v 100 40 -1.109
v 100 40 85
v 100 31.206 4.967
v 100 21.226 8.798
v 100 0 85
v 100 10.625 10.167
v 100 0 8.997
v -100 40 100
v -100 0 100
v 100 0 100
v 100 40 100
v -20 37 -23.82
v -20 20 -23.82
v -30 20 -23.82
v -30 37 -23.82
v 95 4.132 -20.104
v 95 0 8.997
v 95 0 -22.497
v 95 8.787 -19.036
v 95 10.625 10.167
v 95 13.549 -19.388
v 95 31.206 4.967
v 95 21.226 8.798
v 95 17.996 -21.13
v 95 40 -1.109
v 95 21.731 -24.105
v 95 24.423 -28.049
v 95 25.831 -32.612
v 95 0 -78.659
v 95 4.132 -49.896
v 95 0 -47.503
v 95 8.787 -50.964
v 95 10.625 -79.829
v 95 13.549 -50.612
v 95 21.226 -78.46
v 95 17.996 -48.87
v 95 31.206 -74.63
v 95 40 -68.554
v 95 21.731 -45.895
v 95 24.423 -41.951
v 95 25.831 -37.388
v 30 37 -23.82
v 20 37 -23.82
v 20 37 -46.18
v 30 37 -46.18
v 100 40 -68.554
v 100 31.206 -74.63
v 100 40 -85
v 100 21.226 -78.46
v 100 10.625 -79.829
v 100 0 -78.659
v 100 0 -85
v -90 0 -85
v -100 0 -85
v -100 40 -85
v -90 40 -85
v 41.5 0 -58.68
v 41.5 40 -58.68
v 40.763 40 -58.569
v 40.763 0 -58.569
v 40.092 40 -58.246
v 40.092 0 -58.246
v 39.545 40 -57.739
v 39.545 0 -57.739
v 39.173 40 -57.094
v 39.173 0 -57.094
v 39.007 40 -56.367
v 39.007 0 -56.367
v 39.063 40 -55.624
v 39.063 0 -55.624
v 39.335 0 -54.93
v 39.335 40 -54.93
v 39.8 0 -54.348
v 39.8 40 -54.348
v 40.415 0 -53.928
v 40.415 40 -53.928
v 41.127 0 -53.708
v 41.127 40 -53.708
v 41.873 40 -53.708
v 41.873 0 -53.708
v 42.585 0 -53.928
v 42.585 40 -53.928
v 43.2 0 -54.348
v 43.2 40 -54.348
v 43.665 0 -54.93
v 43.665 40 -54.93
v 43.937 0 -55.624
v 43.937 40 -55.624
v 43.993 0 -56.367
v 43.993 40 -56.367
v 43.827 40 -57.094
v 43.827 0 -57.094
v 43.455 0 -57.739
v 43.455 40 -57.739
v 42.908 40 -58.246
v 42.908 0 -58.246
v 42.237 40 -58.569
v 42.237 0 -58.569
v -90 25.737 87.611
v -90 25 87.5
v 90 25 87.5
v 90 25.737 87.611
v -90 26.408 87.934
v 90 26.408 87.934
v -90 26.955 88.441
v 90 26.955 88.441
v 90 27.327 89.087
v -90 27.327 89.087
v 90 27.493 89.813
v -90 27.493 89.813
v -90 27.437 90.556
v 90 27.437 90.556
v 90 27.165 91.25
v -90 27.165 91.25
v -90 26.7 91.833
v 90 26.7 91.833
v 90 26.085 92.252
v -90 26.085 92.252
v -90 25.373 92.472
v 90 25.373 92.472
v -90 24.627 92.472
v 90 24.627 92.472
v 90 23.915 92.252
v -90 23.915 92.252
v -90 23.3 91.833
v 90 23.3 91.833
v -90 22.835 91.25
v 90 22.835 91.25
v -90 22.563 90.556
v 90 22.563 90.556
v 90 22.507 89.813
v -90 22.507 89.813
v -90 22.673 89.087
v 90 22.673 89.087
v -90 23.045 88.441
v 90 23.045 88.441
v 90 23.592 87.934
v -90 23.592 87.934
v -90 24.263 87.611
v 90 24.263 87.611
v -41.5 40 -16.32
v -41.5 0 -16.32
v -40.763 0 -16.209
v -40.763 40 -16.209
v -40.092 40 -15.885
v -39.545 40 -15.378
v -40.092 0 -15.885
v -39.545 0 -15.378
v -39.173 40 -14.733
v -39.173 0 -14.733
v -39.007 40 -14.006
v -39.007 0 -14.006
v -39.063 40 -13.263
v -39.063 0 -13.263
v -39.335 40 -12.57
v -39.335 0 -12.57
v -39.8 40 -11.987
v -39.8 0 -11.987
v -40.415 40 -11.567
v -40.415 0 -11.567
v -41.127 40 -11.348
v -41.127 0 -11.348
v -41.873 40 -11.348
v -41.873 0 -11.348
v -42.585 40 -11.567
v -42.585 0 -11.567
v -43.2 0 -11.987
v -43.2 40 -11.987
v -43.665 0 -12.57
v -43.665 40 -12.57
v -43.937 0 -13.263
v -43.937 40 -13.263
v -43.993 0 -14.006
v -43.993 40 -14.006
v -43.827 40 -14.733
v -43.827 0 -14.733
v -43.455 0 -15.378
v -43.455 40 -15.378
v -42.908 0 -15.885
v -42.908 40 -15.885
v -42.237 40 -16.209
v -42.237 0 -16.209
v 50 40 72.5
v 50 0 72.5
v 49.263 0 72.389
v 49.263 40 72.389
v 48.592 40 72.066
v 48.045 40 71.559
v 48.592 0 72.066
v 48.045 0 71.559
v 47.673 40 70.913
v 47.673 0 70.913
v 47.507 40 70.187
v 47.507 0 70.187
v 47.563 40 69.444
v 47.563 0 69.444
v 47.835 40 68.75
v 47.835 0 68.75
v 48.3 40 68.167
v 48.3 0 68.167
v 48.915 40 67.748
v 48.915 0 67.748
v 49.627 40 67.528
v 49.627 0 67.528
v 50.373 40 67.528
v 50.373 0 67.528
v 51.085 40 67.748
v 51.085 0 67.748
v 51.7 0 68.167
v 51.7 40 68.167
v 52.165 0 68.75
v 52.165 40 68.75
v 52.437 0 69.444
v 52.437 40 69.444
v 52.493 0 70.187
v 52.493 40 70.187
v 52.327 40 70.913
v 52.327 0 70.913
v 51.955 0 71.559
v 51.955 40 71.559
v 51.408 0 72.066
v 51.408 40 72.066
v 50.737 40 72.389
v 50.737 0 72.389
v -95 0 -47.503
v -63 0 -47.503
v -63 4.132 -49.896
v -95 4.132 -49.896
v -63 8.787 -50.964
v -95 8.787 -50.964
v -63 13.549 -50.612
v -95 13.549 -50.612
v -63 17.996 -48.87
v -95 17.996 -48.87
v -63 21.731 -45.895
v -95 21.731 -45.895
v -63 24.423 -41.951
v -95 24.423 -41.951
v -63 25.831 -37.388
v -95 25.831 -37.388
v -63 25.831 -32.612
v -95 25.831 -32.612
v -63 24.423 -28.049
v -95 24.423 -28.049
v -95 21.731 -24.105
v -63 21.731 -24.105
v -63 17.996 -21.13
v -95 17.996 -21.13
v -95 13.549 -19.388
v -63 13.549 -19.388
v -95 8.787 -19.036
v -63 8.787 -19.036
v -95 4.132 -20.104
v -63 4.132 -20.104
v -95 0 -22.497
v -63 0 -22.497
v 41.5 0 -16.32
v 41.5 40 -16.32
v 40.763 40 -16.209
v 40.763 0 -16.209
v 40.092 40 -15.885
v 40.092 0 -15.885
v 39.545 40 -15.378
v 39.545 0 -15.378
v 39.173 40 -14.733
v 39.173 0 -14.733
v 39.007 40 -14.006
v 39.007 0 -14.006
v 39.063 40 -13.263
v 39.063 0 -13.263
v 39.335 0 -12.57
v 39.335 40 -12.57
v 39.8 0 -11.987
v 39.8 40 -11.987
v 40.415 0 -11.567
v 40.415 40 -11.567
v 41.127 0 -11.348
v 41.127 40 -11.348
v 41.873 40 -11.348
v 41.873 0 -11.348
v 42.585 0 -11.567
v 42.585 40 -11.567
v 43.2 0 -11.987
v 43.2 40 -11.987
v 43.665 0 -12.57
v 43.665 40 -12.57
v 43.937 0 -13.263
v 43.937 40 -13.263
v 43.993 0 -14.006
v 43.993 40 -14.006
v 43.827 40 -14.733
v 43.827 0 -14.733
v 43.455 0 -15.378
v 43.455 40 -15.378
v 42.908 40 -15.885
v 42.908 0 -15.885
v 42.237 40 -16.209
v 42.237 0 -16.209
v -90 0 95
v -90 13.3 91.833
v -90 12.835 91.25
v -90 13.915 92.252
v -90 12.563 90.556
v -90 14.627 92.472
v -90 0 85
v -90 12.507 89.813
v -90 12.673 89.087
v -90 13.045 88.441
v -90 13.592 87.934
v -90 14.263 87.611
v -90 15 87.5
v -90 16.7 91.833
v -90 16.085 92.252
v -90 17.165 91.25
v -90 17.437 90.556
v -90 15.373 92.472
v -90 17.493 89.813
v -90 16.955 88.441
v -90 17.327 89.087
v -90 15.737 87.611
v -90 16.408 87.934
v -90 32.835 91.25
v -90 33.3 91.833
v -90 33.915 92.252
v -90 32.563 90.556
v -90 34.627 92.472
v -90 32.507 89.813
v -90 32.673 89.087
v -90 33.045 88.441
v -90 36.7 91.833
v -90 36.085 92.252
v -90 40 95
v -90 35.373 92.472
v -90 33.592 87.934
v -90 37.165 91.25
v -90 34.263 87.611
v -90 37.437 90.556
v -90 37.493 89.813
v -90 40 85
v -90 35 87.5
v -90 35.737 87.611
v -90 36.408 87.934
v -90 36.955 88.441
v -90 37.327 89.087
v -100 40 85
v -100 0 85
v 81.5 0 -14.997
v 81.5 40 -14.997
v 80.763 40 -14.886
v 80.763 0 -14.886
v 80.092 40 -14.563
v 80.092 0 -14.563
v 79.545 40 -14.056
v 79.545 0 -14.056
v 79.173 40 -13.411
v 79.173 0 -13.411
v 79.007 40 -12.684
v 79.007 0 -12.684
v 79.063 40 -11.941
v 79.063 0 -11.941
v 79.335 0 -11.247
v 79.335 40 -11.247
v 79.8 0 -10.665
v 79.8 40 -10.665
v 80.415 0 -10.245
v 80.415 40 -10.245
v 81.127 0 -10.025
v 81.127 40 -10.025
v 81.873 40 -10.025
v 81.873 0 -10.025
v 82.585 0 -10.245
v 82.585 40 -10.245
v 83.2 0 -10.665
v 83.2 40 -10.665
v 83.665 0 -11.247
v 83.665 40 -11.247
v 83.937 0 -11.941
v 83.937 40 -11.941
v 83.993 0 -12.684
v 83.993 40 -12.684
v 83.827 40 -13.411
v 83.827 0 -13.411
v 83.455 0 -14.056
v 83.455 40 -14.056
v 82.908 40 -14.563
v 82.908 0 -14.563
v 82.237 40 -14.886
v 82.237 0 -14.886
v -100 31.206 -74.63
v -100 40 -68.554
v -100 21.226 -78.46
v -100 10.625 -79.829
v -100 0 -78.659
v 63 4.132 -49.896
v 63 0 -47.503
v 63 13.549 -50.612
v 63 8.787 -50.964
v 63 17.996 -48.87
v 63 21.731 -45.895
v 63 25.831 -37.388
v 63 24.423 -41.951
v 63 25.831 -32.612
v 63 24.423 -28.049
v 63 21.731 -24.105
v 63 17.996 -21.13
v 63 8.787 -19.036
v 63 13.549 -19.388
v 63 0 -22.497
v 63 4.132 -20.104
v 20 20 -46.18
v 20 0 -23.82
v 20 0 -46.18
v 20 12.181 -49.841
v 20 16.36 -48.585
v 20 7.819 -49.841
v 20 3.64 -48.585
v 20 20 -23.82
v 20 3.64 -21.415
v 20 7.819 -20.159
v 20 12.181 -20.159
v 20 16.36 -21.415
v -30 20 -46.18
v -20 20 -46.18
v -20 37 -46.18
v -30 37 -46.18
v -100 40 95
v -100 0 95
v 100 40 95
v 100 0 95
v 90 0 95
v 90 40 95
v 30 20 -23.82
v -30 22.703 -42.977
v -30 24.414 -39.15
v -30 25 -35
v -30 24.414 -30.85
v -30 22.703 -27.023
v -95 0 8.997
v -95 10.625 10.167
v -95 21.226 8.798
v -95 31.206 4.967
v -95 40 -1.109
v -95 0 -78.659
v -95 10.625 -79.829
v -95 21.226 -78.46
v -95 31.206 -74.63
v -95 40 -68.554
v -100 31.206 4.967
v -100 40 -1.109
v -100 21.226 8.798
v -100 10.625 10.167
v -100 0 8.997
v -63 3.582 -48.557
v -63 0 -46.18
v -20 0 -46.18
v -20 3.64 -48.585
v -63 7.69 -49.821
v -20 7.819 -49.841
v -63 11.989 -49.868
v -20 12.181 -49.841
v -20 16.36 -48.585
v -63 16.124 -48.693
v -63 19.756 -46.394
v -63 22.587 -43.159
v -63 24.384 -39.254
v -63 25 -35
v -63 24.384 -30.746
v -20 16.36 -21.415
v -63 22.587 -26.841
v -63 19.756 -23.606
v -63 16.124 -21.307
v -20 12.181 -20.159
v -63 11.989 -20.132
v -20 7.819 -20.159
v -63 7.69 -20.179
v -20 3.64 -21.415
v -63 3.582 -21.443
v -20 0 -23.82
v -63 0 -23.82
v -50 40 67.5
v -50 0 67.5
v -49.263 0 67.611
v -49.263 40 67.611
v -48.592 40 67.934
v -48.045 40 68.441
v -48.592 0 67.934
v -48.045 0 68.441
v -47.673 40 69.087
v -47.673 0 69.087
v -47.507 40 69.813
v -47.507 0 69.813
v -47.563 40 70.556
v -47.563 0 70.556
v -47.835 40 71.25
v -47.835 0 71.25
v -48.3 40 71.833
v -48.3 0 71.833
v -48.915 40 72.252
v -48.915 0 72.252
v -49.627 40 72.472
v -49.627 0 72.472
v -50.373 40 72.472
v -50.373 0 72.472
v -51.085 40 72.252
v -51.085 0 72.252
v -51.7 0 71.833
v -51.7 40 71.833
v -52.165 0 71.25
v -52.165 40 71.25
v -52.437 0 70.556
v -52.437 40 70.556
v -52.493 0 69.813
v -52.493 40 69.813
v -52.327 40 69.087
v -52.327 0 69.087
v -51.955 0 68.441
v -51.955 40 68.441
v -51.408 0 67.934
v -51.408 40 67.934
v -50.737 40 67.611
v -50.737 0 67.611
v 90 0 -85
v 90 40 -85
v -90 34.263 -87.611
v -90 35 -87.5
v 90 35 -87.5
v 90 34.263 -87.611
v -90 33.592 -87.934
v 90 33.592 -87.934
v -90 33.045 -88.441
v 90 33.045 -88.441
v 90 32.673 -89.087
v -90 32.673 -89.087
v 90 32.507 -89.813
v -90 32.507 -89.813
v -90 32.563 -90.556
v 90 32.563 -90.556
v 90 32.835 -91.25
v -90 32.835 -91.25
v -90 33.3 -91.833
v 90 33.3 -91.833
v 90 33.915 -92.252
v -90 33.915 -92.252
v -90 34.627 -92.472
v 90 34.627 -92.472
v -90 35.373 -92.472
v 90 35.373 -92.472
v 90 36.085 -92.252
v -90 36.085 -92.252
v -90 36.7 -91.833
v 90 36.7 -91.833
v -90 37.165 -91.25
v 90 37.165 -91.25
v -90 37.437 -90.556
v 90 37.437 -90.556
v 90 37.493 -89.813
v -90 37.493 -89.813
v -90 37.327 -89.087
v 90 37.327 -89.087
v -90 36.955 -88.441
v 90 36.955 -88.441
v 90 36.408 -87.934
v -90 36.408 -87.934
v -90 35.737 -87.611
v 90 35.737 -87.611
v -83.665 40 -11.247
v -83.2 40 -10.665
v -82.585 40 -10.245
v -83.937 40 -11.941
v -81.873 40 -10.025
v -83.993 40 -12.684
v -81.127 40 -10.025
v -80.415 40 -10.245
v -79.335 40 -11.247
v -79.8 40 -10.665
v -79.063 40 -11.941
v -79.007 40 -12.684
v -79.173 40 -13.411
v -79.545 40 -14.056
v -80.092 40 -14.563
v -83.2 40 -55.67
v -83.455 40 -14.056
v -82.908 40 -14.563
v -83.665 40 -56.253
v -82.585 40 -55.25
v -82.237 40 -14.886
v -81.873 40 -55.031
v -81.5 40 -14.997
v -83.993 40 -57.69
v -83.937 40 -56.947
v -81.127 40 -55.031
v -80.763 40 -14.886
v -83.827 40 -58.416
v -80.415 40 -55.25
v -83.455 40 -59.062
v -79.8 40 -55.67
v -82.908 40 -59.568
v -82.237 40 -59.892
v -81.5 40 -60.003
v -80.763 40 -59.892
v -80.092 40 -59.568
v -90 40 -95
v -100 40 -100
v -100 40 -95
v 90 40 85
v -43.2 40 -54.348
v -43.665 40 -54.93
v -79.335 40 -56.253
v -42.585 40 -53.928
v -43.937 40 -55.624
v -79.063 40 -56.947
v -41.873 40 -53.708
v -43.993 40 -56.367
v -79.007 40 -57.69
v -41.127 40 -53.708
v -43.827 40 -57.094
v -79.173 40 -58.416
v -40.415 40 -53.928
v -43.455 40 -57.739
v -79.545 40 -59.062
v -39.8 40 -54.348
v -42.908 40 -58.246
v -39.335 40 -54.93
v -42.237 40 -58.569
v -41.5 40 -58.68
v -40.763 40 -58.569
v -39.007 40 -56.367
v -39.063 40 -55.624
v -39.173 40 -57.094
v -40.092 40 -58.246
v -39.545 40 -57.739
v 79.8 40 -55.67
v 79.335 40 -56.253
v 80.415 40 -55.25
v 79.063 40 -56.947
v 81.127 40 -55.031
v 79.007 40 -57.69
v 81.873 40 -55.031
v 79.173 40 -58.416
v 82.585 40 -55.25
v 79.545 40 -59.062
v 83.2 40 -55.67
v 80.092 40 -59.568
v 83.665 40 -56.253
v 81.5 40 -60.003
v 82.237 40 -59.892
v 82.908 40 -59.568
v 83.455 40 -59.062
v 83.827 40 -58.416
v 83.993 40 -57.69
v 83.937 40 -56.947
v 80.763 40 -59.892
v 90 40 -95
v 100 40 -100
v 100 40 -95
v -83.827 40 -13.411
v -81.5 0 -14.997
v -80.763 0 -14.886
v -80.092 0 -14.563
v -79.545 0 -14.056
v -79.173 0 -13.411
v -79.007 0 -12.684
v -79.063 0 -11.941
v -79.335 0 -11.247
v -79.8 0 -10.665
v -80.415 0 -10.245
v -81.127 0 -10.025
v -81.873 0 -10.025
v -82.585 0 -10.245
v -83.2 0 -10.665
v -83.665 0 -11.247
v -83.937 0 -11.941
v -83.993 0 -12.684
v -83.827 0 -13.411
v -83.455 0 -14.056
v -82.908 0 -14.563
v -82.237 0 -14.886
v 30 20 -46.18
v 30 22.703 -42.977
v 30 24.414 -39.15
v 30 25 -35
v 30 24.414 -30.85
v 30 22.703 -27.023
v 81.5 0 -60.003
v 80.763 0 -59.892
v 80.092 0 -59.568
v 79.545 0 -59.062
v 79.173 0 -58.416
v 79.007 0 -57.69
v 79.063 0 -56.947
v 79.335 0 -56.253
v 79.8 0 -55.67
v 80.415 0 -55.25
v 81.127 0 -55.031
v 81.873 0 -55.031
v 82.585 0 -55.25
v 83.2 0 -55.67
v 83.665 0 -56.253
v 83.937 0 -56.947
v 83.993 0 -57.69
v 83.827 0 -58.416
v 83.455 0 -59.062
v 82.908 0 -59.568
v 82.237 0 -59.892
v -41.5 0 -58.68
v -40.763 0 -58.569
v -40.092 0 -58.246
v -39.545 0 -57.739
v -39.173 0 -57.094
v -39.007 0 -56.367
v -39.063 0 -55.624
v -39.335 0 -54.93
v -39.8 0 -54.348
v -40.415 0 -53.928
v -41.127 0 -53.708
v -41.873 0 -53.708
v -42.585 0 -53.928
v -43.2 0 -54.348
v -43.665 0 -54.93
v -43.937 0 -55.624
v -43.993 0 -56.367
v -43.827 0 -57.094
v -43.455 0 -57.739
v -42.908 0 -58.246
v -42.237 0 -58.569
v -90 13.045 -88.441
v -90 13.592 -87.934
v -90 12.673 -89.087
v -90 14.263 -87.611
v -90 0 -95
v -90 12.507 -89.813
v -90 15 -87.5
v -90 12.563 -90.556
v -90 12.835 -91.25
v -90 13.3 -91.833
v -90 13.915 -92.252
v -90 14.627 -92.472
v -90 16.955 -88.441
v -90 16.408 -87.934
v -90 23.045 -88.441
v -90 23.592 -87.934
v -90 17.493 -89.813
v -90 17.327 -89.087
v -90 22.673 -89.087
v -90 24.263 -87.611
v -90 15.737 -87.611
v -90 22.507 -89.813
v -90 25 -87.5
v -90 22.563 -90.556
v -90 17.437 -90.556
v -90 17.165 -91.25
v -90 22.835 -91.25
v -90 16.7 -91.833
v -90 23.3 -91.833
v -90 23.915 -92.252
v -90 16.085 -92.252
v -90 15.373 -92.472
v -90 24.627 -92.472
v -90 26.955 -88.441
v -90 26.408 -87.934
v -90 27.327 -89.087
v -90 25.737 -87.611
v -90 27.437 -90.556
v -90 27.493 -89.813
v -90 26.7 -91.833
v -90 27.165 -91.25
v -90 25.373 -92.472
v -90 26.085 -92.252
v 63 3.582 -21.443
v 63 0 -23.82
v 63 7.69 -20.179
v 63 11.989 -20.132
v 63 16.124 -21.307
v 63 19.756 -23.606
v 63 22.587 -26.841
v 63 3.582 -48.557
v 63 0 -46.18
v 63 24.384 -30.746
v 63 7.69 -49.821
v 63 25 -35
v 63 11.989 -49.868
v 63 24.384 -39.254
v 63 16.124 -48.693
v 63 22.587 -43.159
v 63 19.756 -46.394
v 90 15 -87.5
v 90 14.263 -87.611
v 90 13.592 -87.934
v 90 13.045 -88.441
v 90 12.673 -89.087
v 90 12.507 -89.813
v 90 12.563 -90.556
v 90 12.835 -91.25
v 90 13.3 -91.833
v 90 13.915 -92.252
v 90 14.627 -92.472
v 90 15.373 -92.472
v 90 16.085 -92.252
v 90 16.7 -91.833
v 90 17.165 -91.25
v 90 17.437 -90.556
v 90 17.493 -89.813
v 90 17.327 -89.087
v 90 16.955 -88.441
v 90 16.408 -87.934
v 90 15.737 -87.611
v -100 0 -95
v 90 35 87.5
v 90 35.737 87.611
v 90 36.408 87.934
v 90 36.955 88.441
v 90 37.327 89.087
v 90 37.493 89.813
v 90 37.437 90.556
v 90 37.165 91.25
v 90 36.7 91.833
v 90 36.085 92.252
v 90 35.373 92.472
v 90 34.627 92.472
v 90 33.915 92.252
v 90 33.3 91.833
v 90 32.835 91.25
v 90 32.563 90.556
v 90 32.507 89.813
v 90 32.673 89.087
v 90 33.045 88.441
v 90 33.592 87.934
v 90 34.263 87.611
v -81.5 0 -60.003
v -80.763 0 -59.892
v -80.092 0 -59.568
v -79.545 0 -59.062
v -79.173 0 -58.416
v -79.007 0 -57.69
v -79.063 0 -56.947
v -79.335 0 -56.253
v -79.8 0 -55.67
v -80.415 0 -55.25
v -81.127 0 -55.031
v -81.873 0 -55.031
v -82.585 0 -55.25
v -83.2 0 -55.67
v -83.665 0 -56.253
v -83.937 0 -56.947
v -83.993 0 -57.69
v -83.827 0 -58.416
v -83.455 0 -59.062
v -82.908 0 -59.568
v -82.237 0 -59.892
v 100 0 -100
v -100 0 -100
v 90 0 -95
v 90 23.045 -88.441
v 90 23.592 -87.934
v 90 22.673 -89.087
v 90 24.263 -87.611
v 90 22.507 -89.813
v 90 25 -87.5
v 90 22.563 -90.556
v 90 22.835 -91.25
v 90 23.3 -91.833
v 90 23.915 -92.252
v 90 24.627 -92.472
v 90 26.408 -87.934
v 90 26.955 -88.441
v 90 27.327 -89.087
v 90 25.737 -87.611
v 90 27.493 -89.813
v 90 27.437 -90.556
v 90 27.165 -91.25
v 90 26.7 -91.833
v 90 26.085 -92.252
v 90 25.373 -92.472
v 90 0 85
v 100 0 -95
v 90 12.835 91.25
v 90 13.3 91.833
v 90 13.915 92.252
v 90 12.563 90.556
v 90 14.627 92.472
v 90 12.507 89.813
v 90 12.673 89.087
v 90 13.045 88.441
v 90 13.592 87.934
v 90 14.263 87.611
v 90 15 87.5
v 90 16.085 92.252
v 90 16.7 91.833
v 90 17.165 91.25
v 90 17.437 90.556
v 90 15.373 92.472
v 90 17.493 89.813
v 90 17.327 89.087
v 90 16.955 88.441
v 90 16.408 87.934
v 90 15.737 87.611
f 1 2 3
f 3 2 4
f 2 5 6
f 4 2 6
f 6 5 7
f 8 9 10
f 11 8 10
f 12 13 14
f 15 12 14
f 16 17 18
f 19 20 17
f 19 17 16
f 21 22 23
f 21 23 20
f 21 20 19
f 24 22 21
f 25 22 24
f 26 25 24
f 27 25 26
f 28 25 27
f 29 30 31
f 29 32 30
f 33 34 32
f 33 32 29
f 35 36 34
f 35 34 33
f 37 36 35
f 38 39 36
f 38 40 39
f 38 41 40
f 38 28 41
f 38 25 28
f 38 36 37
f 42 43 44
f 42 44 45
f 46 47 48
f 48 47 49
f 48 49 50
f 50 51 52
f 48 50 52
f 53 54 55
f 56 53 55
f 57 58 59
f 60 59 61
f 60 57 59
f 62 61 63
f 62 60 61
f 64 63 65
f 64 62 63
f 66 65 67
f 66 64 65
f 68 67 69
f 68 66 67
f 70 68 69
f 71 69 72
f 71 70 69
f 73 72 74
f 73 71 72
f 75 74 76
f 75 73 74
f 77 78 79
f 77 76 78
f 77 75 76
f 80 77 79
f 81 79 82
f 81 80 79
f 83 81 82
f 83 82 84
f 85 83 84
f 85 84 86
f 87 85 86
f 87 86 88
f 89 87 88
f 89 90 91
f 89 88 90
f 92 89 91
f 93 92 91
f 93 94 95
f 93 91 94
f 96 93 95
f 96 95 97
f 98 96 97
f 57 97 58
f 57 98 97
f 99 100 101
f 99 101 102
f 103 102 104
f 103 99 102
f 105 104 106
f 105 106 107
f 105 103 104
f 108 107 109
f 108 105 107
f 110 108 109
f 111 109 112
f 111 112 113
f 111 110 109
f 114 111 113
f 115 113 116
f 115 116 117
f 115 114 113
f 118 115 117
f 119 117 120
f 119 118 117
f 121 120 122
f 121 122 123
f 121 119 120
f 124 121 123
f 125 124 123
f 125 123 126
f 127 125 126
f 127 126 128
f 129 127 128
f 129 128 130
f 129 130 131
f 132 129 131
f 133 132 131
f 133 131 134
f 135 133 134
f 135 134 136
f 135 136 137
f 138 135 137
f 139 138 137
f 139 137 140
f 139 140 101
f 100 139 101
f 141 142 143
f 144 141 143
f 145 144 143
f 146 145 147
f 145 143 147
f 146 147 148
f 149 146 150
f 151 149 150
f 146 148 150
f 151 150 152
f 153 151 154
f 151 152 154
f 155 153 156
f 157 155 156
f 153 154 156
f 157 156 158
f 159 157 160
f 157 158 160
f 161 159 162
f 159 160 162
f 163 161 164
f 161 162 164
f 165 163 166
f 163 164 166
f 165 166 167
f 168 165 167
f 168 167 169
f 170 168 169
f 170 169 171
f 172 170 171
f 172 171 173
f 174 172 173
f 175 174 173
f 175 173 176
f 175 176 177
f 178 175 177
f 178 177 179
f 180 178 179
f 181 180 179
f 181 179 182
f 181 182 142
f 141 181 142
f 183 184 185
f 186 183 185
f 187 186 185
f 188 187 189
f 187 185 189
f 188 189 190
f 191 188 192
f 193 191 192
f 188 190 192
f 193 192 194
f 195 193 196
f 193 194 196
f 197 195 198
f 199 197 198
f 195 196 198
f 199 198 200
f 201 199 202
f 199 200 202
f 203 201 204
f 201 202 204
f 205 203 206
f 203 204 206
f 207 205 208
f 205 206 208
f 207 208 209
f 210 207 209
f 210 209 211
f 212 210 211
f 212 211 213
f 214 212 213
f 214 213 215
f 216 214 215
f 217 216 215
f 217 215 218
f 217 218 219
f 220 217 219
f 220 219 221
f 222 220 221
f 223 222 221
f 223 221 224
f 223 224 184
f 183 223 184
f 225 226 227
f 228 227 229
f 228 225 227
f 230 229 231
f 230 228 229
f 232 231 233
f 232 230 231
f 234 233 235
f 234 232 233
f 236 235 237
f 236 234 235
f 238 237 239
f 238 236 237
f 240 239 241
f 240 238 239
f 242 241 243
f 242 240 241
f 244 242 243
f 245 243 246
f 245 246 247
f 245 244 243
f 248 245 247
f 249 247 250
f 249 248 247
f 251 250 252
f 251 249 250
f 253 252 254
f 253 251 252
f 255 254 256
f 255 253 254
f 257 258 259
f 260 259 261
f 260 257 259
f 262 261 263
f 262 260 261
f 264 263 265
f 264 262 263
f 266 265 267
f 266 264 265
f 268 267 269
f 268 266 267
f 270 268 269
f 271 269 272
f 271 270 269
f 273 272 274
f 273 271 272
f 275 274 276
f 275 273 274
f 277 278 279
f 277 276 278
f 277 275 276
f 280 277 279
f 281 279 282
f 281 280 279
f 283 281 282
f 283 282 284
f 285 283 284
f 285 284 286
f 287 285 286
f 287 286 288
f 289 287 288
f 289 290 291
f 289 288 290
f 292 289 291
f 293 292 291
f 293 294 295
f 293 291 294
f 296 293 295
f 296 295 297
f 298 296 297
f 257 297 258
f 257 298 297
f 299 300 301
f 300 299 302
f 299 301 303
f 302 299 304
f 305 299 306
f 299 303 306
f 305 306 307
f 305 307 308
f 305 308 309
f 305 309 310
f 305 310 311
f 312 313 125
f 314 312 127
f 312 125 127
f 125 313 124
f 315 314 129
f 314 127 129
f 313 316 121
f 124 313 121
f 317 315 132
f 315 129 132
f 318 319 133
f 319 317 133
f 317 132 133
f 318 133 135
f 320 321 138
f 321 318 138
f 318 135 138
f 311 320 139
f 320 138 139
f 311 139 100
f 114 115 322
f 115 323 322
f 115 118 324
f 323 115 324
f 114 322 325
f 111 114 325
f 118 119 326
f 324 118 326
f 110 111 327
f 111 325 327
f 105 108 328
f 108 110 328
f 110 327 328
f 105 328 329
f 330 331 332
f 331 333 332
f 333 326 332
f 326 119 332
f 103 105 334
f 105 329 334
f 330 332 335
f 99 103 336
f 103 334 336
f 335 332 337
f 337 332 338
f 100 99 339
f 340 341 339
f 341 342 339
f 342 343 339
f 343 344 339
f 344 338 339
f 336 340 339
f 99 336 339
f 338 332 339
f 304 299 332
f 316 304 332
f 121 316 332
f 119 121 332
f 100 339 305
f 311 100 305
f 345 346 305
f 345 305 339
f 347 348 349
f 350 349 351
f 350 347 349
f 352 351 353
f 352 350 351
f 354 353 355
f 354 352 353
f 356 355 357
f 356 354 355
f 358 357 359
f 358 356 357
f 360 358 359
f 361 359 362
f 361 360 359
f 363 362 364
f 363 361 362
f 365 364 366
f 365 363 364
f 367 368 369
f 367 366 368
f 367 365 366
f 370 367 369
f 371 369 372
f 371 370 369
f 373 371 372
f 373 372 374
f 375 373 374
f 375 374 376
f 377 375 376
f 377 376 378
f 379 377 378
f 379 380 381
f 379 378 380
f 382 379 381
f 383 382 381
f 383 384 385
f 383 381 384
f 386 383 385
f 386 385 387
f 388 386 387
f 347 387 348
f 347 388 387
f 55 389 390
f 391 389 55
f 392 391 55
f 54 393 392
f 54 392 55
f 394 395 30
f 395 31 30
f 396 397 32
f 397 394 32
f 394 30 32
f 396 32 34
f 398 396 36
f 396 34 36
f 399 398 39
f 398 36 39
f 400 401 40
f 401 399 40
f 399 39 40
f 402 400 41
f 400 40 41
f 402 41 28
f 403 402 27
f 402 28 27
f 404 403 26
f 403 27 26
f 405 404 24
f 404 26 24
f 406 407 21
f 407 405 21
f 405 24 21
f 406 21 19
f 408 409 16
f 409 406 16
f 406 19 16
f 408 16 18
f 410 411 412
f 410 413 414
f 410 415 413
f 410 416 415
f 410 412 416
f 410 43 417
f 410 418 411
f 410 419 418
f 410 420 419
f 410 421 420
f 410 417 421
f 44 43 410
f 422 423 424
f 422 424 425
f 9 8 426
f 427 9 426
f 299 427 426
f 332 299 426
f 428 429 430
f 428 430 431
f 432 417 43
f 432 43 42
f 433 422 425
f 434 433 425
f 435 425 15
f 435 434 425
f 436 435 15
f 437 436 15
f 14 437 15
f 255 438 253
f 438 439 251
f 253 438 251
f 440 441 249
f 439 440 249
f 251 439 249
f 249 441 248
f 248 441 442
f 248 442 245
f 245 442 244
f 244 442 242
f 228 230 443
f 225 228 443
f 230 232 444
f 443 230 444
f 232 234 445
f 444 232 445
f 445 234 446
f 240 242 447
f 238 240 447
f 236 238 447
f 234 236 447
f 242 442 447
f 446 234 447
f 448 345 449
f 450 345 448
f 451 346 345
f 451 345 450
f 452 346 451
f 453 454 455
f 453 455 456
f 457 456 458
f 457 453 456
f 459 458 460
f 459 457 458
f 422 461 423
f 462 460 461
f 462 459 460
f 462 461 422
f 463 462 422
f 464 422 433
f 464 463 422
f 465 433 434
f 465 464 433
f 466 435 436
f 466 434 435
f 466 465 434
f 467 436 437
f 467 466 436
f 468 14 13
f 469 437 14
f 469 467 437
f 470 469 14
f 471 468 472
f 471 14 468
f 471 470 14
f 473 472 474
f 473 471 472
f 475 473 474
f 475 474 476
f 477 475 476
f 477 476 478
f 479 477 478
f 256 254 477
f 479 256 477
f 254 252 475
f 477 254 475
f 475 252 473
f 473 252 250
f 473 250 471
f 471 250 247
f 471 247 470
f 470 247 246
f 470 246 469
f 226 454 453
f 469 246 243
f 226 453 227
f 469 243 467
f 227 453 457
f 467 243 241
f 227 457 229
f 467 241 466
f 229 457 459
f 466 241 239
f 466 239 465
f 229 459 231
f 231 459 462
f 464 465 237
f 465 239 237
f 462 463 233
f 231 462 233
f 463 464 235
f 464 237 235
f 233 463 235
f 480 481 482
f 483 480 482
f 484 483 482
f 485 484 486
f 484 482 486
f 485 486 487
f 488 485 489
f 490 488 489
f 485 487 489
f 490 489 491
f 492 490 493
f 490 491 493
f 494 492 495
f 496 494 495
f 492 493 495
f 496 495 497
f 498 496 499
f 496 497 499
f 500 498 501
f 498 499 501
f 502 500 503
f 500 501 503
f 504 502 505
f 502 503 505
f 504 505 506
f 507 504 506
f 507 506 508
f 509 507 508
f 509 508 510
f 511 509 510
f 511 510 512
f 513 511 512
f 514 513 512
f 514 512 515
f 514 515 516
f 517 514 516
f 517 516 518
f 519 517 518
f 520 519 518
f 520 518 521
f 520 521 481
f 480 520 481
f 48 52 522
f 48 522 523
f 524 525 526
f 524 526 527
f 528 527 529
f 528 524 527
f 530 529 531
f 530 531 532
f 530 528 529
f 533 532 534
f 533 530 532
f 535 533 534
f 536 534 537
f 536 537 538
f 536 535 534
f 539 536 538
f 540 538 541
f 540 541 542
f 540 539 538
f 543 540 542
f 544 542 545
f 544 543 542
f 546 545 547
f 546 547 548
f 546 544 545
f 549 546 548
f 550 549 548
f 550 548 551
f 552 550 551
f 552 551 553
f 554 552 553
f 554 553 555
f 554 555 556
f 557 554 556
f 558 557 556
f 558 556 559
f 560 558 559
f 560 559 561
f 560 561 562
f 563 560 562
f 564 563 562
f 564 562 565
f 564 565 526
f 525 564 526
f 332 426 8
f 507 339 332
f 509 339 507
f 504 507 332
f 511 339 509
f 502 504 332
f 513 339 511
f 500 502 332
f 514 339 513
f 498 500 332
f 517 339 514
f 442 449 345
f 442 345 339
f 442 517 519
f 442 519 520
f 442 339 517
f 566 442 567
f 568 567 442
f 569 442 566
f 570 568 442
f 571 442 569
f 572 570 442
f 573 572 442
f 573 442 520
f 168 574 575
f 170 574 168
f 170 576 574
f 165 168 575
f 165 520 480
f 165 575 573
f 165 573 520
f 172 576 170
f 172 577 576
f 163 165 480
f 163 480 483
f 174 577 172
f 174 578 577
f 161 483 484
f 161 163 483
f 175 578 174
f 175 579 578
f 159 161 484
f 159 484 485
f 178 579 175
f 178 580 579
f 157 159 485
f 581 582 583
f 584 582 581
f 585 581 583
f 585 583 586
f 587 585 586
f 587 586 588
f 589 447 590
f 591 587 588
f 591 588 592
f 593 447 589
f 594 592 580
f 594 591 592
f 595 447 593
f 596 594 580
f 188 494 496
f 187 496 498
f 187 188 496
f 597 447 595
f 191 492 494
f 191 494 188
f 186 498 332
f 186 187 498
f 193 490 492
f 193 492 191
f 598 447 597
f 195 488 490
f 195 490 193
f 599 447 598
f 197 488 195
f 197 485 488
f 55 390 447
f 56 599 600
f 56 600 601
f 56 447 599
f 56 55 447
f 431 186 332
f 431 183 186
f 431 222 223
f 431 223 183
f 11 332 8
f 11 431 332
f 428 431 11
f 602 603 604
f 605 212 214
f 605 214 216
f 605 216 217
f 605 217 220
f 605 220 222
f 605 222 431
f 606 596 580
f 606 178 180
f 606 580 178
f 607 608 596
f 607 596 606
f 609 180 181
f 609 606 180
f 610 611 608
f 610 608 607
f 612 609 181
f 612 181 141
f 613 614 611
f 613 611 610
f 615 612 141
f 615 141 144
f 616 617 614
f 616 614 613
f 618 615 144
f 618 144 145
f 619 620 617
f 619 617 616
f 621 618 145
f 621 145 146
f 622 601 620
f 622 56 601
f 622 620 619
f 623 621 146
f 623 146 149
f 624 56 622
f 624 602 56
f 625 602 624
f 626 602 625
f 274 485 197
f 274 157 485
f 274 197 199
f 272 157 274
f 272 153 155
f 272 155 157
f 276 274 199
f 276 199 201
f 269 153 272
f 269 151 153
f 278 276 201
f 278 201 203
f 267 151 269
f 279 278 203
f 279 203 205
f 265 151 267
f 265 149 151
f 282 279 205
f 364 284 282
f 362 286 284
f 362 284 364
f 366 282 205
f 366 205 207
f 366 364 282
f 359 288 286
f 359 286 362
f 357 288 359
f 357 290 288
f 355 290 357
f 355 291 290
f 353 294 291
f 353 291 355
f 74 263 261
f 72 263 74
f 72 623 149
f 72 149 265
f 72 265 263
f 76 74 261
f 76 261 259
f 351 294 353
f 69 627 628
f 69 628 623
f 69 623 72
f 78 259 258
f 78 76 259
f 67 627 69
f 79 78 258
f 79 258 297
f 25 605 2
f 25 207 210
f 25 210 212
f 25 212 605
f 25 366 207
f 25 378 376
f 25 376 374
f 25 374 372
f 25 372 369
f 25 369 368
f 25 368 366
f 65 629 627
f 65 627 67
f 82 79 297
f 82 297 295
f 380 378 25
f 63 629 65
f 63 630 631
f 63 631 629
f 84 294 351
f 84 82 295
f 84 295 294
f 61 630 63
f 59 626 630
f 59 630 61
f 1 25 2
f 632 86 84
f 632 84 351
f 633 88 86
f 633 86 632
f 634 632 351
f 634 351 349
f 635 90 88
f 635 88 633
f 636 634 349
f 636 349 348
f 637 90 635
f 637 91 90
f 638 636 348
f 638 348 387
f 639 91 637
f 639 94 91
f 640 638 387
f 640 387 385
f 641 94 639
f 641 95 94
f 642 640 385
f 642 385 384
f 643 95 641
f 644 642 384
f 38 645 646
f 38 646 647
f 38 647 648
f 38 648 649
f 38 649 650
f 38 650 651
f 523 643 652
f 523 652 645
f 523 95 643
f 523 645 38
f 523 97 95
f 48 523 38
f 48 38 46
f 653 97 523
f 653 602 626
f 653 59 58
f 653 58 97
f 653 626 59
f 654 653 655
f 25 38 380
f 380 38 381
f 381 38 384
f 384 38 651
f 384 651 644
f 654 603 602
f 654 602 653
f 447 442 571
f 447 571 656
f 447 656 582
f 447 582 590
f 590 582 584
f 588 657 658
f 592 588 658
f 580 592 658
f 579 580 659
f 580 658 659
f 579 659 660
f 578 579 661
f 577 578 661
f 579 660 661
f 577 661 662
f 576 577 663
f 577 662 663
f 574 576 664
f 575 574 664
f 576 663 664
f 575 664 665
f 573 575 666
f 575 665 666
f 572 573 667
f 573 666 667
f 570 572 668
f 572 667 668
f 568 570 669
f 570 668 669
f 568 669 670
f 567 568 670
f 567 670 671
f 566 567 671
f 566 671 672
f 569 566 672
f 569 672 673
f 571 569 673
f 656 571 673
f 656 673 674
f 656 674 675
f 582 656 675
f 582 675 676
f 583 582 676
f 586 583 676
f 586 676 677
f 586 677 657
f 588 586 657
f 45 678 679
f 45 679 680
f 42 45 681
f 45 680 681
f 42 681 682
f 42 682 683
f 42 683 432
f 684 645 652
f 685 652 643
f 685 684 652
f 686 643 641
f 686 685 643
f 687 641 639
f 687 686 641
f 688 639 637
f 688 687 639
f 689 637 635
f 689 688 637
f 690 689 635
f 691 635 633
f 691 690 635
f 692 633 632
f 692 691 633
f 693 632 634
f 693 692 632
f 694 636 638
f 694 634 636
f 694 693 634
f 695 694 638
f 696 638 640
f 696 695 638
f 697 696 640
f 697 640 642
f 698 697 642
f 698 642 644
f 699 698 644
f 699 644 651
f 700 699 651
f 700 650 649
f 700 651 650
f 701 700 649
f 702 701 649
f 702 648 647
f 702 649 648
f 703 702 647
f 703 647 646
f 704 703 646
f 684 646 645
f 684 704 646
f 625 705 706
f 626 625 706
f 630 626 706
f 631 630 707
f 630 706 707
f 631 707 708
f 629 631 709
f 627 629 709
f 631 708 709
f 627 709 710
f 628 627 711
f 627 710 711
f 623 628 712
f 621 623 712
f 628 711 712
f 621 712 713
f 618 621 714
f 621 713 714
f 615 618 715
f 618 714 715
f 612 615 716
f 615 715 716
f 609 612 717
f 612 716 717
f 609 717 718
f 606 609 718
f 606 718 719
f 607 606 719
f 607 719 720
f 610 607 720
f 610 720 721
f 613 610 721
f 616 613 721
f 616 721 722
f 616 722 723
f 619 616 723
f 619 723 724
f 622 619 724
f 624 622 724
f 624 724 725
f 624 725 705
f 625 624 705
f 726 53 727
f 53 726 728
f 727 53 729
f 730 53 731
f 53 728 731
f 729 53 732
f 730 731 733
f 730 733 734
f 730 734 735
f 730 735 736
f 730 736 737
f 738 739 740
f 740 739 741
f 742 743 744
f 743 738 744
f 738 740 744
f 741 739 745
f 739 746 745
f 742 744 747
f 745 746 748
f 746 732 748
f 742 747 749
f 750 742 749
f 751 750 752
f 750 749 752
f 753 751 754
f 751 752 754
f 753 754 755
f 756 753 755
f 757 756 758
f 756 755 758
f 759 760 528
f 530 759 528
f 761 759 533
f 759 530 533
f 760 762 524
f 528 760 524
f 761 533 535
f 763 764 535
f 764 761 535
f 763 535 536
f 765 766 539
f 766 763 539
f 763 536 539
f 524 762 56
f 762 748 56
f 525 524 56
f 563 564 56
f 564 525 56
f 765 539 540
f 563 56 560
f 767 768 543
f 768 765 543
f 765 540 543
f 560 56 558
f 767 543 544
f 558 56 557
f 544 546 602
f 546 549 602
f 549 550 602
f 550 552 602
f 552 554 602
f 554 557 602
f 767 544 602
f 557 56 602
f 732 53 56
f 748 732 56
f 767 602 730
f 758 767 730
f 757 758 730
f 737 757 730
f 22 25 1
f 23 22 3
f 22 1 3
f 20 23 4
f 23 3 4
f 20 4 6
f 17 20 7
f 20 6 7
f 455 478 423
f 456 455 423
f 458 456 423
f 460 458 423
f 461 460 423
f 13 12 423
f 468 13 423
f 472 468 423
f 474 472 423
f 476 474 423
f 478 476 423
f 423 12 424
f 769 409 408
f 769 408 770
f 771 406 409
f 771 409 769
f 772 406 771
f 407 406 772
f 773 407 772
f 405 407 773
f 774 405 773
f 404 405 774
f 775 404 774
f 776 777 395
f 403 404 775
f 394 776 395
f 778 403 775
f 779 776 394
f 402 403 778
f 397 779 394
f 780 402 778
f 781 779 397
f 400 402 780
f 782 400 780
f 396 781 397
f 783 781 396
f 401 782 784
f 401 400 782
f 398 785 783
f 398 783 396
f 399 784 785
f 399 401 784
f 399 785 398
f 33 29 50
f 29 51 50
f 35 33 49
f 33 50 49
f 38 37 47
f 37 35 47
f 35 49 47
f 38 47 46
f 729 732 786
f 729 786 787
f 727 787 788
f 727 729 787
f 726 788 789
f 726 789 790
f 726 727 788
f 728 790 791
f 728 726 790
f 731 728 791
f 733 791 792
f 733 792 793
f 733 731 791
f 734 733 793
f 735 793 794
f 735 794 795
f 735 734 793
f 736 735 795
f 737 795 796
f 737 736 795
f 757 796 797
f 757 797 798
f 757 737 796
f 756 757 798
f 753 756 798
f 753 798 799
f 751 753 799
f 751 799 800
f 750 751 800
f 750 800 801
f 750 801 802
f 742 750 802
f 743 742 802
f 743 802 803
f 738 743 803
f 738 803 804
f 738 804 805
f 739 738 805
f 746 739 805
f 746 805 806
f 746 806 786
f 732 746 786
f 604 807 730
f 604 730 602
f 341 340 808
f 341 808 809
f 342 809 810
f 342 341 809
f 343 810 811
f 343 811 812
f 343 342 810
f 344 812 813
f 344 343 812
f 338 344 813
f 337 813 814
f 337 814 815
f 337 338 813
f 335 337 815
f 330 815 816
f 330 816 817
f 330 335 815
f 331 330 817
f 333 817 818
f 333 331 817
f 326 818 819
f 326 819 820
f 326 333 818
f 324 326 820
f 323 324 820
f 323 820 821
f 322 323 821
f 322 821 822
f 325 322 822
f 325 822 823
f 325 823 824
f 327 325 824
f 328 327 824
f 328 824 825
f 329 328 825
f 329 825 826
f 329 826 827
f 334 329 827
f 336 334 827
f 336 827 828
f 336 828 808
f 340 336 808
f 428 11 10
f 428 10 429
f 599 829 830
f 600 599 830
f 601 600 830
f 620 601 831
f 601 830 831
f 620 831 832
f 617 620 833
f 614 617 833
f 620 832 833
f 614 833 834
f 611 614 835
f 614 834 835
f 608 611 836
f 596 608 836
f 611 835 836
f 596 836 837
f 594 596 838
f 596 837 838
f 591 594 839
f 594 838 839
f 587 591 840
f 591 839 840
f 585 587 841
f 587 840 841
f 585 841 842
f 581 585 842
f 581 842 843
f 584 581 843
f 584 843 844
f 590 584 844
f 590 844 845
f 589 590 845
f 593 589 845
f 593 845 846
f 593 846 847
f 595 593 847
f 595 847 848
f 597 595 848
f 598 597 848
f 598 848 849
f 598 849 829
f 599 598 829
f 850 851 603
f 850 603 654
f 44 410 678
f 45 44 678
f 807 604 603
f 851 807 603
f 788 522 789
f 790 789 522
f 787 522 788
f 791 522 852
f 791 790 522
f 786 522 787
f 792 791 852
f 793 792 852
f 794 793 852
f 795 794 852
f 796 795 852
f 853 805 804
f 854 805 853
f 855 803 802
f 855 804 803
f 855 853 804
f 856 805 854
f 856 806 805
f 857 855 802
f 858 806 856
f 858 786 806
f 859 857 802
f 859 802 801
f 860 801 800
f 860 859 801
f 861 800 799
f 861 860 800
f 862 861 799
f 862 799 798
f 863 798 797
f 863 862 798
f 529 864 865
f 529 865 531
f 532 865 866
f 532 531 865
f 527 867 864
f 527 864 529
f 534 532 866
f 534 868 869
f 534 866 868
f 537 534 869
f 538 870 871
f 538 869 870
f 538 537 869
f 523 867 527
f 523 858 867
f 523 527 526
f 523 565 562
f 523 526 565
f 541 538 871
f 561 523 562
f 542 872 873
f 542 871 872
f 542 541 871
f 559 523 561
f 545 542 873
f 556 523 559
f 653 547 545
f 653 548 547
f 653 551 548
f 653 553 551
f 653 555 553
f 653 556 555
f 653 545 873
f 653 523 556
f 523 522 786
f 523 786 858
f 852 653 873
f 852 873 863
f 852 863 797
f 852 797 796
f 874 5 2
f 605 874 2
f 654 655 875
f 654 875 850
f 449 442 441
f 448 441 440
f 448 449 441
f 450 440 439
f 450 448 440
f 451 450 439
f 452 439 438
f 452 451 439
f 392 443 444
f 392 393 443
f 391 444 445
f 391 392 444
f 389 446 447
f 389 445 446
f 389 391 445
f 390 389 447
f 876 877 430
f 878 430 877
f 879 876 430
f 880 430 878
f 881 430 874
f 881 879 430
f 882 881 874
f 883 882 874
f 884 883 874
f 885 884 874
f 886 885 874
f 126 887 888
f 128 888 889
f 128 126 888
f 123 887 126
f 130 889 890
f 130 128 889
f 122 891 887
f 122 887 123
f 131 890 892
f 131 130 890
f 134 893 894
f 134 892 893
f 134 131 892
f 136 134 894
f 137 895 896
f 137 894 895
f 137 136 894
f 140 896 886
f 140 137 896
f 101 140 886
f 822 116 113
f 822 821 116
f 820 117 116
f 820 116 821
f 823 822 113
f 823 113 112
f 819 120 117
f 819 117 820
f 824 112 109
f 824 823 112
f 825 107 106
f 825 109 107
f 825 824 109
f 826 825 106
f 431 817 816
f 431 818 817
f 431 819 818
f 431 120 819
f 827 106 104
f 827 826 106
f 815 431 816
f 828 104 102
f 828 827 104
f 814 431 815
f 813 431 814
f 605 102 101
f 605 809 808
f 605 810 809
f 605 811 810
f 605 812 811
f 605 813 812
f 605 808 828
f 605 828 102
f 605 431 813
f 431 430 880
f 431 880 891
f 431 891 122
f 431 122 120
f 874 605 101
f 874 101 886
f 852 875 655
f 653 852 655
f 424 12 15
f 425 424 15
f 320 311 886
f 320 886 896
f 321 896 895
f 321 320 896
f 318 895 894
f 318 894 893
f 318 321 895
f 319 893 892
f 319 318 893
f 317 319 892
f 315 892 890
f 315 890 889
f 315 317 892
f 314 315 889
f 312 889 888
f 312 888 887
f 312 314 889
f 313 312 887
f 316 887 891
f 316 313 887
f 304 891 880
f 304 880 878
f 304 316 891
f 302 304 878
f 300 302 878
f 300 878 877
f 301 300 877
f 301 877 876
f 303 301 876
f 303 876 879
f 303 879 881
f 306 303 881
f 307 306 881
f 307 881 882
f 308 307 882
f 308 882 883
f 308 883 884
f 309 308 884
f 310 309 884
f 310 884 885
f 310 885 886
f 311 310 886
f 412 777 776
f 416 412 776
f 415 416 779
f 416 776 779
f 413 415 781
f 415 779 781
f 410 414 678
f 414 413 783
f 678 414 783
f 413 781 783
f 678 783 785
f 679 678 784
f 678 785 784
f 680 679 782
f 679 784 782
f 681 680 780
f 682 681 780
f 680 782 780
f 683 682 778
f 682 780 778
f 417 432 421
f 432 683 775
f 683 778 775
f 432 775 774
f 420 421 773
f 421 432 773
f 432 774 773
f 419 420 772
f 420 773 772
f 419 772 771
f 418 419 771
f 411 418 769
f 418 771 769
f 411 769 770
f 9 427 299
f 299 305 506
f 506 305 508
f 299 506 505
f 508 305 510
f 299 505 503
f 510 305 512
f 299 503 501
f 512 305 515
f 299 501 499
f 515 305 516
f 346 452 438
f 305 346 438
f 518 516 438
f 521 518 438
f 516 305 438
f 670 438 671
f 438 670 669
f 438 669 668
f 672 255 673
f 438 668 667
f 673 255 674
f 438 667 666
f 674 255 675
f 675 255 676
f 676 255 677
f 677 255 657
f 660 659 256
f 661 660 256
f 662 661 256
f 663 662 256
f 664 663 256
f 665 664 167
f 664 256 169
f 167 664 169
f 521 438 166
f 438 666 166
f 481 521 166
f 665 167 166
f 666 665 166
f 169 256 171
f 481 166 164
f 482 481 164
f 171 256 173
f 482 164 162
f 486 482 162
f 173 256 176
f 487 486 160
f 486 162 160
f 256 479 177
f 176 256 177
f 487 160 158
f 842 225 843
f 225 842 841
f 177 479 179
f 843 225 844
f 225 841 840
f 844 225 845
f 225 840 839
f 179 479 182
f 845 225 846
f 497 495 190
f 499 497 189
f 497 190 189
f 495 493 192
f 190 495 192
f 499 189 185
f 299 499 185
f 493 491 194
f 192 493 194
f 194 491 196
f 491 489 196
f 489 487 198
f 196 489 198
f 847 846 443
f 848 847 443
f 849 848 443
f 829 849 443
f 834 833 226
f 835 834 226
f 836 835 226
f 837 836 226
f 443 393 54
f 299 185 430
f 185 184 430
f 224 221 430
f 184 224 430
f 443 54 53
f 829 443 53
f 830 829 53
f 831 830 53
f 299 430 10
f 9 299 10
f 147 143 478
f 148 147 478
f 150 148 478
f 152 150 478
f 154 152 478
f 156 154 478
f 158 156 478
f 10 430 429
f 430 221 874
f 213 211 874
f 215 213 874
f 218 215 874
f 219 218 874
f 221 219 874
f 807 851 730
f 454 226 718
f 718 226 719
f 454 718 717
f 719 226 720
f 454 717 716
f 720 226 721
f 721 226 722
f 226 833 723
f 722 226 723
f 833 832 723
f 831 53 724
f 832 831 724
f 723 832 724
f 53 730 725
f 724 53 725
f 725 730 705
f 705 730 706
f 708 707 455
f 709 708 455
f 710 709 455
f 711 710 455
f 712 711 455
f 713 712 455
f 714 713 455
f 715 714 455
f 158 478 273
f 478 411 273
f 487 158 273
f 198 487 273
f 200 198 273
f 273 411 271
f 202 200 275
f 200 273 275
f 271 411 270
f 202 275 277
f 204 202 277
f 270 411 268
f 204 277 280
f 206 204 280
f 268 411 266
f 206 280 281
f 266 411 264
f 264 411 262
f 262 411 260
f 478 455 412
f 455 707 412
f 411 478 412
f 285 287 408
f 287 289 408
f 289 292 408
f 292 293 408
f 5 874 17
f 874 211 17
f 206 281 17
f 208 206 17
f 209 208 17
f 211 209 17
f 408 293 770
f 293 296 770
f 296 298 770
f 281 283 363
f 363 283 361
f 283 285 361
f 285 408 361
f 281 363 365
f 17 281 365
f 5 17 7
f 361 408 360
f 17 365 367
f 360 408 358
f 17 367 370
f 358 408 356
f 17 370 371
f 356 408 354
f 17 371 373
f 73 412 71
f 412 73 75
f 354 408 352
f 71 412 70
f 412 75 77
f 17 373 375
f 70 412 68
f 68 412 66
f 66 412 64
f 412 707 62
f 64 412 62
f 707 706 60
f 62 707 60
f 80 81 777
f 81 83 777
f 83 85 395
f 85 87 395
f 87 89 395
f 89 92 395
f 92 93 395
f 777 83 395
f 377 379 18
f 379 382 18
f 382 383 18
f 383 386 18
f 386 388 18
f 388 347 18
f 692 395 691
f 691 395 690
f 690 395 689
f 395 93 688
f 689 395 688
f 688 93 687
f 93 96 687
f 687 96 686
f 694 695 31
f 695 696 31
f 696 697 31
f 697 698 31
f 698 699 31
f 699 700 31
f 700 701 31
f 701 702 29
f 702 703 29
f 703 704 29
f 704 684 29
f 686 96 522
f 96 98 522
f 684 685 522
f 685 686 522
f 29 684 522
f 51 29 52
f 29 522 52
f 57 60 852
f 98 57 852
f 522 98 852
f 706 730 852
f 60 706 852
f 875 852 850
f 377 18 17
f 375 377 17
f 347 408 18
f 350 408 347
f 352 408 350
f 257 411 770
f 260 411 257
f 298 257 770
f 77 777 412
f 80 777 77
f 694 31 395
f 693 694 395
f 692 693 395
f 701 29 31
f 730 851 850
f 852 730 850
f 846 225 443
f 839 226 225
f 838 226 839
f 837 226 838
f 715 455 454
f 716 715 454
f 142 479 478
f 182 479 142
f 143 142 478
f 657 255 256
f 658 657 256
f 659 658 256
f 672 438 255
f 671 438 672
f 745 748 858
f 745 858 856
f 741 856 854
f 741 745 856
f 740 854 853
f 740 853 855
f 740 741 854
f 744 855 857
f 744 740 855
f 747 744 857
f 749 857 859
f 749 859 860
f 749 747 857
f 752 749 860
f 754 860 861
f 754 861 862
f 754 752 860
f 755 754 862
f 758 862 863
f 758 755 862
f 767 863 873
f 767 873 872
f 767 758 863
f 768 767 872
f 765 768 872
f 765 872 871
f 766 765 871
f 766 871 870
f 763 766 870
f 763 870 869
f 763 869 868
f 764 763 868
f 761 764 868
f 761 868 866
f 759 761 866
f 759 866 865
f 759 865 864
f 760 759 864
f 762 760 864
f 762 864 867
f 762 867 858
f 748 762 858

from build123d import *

# Parameters (mm, degrees)
ESQUISSE2_W             = 200
ESQUISSE2_H             = 200
BASE_DEPTH              = 40
ESQUISSE3_R             = 15
BLOC_MOTEUR_1_DEPTH     = 80
ESQUISSE4_W             = 10
ESQUISSE4_H             = 22.360679774
ACCES_MOTEUR_DEPTH      = 37
ESQUISSE6_R             = 16.01
BLOC_MOTEUR_2_DEPTH     = 37
ESQUISSE7_R             = 2.5
VIS_MOTEUR_DEPTH        = 147.969384567
ESQUISSE8_R             = 45
VIDE_ROUE_DEPTH         = 5
ESQUISSE9_W             = 10
ESQUISSE9_H             = 40
VIDE_GUIDAGE_TIGE_DEPTH = 10
ESQUISSE10_R            = 2.5
TROU_VIS_DEPTH          = 100
ESQUISSE11_R            = 2.5
VIDE_PATIN_DEPTH        = 147.969384567


with BuildPart() as part:
    # Esquisse2 → BASE (new body)
    with BuildSketch(Plane(origin=(0, 0, 0), x_dir=(1, 0, 0), z_dir=(0, 1, 0))):
        Rectangle(ESQUISSE2_W, ESQUISSE2_H)
    extrude(amount=BASE_DEPTH)

    # Esquisse3 → BLOC MOTEUR 1. (cut)
    with BuildSketch(Plane(origin=(100, 0, 0), x_dir=(0, 0, -1), z_dir=(1, 0, 0))):
        with Locations((35, 10)):
            Circle(ESQUISSE3_R)
    bloc_moteur_1 = extrude(amount=-BLOC_MOTEUR_1_DEPTH, mode=Mode.SUBTRACT)

    # Esquisse4 → ACCES MOTEUR (cut)
    with BuildSketch(Plane.XZ):
        with Locations((25, -35)):
            Rectangle(ESQUISSE4_W, ESQUISSE4_H)
    acces_moteur = extrude(amount=-ACCES_MOTEUR_DEPTH, mode=Mode.SUBTRACT)

    # Esquisse6 → BLOC MOTEUR 2 (cut)
    with BuildSketch(Plane(origin=(100, 0, 0), x_dir=(0, 0, -1), z_dir=(1, 0, 0))):
        with Locations((35, 10)):
            Circle(ESQUISSE6_R)
    bloc_moteur_2 = extrude(amount=-BLOC_MOTEUR_2_DEPTH, mode=Mode.SUBTRACT)

    # SYM BLOC MOTEUR: BLOC MOTEUR 1., ACCES MOTEUR, BLOC MOTEUR 2 across plane
    add(bloc_moteur_1.mirror(Plane(origin=(0, 0, 0), x_dir=(0, 0, 1), z_dir=(1, 0, 0))), mode=Mode.SUBTRACT)
    add(acces_moteur.mirror(Plane(origin=(0, 0, 0), x_dir=(0, 0, 1), z_dir=(1, 0, 0))), mode=Mode.SUBTRACT)
    add(bloc_moteur_2.mirror(Plane(origin=(0, 0, 0), x_dir=(0, 0, 1), z_dir=(1, 0, 0))), mode=Mode.SUBTRACT)

    # Esquisse7 → VIS MOTEUR (cut, through all)
    with BuildSketch(Plane.XZ):
        with Locations(Location((-81.5, -12.497196314, 0), (0, 0, 270))):
            Circle(ESQUISSE7_R)
        with Locations(Location((-41.5, -13.819660113, 0), (0, 0, 270))):
            Circle(ESQUISSE7_R)
        with Locations(Location((-41.5, -56.180339887, 0), (0, 0, 270))):
            Circle(ESQUISSE7_R)
        with Locations(Location((-81.5, -57.502803686, 0), (0, 0, 270))):
            Circle(ESQUISSE7_R)
    vis_moteur = extrude(amount=-VIS_MOTEUR_DEPTH, mode=Mode.SUBTRACT)

    # SYM VIS: VIS MOTEUR across plane
    add(vis_moteur.mirror(Plane(origin=(0, 0, 0), x_dir=(0, 0, 1), z_dir=(1, 0, 0))), mode=Mode.SUBTRACT)

    # Esquisse8 → VIDE ROUE (cut)
    with BuildSketch(Plane(origin=(100, 0, 0), x_dir=(0, 0, -1), z_dir=(1, 0, 0))):
        with Locations((34.831239624, 10.203988641)):
            Circle(ESQUISSE8_R)
    vide_roue = extrude(amount=-VIDE_ROUE_DEPTH, mode=Mode.SUBTRACT)

    # Esquisse9 → VIDE GUIDAGE TIGE (cut)
    with BuildSketch(Plane(origin=(100, 0, 0), x_dir=(0, 0, -1), z_dir=(1, 0, 0))):
        with Locations((90, 20)):
            Rectangle(ESQUISSE9_W, ESQUISSE9_H)
        with Locations((-90, 20)):
            Rectangle(ESQUISSE9_W, ESQUISSE9_H)
    vide_guidage_tige = extrude(amount=-VIDE_GUIDAGE_TIGE_DEPTH, mode=Mode.SUBTRACT)

    # Esquisse10 → TROU VIS (cut)
    with BuildSketch(Plane(origin=(90, 0, 0), x_dir=(0, 0, -1), z_dir=(1, 0, 0))):
        with Locations((-90, 35)):
            Circle(ESQUISSE10_R)
        with Locations((-90, 25)):
            Circle(ESQUISSE10_R)
        with Locations(Location((90, 25, 0), (0, 0, 180))):
            Circle(ESQUISSE10_R)
        with Locations(Location((90, 35, 0), (0, 0, 180))):
            Circle(ESQUISSE10_R)
        with Locations((-90, 15)):
            Circle(ESQUISSE10_R)
        with Locations(Location((90, 15, 0), (0, 0, 180))):
            Circle(ESQUISSE10_R)
    trou_vis = extrude(amount=-TROU_VIS_DEPTH, mode=Mode.SUBTRACT)

    # SYM - ROUE - TIGE: VIDE ROUE, VIDE GUIDAGE TIGE, TROU VIS across plane
    add(vide_roue.mirror(Plane(origin=(0, 0, 0), x_dir=(0, 0, 1), z_dir=(1, 0, 0))), mode=Mode.SUBTRACT)
    add(vide_guidage_tige.mirror(Plane(origin=(0, 0, 0), x_dir=(0, 0, 1), z_dir=(1, 0, 0))), mode=Mode.SUBTRACT)
    add(trou_vis.mirror(Plane(origin=(0, 0, 0), x_dir=(0, 0, 1), z_dir=(1, 0, 0))), mode=Mode.SUBTRACT)

    # Esquisse11 → VIDE PATIN (cut, through all)
    with BuildSketch(Plane.XZ):
        with Locations(Location((-50, 70, 0), (0, 0, 270))):
            Circle(ESQUISSE11_R)
        with Locations(Location((50, 70, 0), (0, 0, 90))):
            Circle(ESQUISSE11_R)
    extrude(amount=-VIDE_PATIN_DEPTH, mode=Mode.SUBTRACT)


solid = part.part
